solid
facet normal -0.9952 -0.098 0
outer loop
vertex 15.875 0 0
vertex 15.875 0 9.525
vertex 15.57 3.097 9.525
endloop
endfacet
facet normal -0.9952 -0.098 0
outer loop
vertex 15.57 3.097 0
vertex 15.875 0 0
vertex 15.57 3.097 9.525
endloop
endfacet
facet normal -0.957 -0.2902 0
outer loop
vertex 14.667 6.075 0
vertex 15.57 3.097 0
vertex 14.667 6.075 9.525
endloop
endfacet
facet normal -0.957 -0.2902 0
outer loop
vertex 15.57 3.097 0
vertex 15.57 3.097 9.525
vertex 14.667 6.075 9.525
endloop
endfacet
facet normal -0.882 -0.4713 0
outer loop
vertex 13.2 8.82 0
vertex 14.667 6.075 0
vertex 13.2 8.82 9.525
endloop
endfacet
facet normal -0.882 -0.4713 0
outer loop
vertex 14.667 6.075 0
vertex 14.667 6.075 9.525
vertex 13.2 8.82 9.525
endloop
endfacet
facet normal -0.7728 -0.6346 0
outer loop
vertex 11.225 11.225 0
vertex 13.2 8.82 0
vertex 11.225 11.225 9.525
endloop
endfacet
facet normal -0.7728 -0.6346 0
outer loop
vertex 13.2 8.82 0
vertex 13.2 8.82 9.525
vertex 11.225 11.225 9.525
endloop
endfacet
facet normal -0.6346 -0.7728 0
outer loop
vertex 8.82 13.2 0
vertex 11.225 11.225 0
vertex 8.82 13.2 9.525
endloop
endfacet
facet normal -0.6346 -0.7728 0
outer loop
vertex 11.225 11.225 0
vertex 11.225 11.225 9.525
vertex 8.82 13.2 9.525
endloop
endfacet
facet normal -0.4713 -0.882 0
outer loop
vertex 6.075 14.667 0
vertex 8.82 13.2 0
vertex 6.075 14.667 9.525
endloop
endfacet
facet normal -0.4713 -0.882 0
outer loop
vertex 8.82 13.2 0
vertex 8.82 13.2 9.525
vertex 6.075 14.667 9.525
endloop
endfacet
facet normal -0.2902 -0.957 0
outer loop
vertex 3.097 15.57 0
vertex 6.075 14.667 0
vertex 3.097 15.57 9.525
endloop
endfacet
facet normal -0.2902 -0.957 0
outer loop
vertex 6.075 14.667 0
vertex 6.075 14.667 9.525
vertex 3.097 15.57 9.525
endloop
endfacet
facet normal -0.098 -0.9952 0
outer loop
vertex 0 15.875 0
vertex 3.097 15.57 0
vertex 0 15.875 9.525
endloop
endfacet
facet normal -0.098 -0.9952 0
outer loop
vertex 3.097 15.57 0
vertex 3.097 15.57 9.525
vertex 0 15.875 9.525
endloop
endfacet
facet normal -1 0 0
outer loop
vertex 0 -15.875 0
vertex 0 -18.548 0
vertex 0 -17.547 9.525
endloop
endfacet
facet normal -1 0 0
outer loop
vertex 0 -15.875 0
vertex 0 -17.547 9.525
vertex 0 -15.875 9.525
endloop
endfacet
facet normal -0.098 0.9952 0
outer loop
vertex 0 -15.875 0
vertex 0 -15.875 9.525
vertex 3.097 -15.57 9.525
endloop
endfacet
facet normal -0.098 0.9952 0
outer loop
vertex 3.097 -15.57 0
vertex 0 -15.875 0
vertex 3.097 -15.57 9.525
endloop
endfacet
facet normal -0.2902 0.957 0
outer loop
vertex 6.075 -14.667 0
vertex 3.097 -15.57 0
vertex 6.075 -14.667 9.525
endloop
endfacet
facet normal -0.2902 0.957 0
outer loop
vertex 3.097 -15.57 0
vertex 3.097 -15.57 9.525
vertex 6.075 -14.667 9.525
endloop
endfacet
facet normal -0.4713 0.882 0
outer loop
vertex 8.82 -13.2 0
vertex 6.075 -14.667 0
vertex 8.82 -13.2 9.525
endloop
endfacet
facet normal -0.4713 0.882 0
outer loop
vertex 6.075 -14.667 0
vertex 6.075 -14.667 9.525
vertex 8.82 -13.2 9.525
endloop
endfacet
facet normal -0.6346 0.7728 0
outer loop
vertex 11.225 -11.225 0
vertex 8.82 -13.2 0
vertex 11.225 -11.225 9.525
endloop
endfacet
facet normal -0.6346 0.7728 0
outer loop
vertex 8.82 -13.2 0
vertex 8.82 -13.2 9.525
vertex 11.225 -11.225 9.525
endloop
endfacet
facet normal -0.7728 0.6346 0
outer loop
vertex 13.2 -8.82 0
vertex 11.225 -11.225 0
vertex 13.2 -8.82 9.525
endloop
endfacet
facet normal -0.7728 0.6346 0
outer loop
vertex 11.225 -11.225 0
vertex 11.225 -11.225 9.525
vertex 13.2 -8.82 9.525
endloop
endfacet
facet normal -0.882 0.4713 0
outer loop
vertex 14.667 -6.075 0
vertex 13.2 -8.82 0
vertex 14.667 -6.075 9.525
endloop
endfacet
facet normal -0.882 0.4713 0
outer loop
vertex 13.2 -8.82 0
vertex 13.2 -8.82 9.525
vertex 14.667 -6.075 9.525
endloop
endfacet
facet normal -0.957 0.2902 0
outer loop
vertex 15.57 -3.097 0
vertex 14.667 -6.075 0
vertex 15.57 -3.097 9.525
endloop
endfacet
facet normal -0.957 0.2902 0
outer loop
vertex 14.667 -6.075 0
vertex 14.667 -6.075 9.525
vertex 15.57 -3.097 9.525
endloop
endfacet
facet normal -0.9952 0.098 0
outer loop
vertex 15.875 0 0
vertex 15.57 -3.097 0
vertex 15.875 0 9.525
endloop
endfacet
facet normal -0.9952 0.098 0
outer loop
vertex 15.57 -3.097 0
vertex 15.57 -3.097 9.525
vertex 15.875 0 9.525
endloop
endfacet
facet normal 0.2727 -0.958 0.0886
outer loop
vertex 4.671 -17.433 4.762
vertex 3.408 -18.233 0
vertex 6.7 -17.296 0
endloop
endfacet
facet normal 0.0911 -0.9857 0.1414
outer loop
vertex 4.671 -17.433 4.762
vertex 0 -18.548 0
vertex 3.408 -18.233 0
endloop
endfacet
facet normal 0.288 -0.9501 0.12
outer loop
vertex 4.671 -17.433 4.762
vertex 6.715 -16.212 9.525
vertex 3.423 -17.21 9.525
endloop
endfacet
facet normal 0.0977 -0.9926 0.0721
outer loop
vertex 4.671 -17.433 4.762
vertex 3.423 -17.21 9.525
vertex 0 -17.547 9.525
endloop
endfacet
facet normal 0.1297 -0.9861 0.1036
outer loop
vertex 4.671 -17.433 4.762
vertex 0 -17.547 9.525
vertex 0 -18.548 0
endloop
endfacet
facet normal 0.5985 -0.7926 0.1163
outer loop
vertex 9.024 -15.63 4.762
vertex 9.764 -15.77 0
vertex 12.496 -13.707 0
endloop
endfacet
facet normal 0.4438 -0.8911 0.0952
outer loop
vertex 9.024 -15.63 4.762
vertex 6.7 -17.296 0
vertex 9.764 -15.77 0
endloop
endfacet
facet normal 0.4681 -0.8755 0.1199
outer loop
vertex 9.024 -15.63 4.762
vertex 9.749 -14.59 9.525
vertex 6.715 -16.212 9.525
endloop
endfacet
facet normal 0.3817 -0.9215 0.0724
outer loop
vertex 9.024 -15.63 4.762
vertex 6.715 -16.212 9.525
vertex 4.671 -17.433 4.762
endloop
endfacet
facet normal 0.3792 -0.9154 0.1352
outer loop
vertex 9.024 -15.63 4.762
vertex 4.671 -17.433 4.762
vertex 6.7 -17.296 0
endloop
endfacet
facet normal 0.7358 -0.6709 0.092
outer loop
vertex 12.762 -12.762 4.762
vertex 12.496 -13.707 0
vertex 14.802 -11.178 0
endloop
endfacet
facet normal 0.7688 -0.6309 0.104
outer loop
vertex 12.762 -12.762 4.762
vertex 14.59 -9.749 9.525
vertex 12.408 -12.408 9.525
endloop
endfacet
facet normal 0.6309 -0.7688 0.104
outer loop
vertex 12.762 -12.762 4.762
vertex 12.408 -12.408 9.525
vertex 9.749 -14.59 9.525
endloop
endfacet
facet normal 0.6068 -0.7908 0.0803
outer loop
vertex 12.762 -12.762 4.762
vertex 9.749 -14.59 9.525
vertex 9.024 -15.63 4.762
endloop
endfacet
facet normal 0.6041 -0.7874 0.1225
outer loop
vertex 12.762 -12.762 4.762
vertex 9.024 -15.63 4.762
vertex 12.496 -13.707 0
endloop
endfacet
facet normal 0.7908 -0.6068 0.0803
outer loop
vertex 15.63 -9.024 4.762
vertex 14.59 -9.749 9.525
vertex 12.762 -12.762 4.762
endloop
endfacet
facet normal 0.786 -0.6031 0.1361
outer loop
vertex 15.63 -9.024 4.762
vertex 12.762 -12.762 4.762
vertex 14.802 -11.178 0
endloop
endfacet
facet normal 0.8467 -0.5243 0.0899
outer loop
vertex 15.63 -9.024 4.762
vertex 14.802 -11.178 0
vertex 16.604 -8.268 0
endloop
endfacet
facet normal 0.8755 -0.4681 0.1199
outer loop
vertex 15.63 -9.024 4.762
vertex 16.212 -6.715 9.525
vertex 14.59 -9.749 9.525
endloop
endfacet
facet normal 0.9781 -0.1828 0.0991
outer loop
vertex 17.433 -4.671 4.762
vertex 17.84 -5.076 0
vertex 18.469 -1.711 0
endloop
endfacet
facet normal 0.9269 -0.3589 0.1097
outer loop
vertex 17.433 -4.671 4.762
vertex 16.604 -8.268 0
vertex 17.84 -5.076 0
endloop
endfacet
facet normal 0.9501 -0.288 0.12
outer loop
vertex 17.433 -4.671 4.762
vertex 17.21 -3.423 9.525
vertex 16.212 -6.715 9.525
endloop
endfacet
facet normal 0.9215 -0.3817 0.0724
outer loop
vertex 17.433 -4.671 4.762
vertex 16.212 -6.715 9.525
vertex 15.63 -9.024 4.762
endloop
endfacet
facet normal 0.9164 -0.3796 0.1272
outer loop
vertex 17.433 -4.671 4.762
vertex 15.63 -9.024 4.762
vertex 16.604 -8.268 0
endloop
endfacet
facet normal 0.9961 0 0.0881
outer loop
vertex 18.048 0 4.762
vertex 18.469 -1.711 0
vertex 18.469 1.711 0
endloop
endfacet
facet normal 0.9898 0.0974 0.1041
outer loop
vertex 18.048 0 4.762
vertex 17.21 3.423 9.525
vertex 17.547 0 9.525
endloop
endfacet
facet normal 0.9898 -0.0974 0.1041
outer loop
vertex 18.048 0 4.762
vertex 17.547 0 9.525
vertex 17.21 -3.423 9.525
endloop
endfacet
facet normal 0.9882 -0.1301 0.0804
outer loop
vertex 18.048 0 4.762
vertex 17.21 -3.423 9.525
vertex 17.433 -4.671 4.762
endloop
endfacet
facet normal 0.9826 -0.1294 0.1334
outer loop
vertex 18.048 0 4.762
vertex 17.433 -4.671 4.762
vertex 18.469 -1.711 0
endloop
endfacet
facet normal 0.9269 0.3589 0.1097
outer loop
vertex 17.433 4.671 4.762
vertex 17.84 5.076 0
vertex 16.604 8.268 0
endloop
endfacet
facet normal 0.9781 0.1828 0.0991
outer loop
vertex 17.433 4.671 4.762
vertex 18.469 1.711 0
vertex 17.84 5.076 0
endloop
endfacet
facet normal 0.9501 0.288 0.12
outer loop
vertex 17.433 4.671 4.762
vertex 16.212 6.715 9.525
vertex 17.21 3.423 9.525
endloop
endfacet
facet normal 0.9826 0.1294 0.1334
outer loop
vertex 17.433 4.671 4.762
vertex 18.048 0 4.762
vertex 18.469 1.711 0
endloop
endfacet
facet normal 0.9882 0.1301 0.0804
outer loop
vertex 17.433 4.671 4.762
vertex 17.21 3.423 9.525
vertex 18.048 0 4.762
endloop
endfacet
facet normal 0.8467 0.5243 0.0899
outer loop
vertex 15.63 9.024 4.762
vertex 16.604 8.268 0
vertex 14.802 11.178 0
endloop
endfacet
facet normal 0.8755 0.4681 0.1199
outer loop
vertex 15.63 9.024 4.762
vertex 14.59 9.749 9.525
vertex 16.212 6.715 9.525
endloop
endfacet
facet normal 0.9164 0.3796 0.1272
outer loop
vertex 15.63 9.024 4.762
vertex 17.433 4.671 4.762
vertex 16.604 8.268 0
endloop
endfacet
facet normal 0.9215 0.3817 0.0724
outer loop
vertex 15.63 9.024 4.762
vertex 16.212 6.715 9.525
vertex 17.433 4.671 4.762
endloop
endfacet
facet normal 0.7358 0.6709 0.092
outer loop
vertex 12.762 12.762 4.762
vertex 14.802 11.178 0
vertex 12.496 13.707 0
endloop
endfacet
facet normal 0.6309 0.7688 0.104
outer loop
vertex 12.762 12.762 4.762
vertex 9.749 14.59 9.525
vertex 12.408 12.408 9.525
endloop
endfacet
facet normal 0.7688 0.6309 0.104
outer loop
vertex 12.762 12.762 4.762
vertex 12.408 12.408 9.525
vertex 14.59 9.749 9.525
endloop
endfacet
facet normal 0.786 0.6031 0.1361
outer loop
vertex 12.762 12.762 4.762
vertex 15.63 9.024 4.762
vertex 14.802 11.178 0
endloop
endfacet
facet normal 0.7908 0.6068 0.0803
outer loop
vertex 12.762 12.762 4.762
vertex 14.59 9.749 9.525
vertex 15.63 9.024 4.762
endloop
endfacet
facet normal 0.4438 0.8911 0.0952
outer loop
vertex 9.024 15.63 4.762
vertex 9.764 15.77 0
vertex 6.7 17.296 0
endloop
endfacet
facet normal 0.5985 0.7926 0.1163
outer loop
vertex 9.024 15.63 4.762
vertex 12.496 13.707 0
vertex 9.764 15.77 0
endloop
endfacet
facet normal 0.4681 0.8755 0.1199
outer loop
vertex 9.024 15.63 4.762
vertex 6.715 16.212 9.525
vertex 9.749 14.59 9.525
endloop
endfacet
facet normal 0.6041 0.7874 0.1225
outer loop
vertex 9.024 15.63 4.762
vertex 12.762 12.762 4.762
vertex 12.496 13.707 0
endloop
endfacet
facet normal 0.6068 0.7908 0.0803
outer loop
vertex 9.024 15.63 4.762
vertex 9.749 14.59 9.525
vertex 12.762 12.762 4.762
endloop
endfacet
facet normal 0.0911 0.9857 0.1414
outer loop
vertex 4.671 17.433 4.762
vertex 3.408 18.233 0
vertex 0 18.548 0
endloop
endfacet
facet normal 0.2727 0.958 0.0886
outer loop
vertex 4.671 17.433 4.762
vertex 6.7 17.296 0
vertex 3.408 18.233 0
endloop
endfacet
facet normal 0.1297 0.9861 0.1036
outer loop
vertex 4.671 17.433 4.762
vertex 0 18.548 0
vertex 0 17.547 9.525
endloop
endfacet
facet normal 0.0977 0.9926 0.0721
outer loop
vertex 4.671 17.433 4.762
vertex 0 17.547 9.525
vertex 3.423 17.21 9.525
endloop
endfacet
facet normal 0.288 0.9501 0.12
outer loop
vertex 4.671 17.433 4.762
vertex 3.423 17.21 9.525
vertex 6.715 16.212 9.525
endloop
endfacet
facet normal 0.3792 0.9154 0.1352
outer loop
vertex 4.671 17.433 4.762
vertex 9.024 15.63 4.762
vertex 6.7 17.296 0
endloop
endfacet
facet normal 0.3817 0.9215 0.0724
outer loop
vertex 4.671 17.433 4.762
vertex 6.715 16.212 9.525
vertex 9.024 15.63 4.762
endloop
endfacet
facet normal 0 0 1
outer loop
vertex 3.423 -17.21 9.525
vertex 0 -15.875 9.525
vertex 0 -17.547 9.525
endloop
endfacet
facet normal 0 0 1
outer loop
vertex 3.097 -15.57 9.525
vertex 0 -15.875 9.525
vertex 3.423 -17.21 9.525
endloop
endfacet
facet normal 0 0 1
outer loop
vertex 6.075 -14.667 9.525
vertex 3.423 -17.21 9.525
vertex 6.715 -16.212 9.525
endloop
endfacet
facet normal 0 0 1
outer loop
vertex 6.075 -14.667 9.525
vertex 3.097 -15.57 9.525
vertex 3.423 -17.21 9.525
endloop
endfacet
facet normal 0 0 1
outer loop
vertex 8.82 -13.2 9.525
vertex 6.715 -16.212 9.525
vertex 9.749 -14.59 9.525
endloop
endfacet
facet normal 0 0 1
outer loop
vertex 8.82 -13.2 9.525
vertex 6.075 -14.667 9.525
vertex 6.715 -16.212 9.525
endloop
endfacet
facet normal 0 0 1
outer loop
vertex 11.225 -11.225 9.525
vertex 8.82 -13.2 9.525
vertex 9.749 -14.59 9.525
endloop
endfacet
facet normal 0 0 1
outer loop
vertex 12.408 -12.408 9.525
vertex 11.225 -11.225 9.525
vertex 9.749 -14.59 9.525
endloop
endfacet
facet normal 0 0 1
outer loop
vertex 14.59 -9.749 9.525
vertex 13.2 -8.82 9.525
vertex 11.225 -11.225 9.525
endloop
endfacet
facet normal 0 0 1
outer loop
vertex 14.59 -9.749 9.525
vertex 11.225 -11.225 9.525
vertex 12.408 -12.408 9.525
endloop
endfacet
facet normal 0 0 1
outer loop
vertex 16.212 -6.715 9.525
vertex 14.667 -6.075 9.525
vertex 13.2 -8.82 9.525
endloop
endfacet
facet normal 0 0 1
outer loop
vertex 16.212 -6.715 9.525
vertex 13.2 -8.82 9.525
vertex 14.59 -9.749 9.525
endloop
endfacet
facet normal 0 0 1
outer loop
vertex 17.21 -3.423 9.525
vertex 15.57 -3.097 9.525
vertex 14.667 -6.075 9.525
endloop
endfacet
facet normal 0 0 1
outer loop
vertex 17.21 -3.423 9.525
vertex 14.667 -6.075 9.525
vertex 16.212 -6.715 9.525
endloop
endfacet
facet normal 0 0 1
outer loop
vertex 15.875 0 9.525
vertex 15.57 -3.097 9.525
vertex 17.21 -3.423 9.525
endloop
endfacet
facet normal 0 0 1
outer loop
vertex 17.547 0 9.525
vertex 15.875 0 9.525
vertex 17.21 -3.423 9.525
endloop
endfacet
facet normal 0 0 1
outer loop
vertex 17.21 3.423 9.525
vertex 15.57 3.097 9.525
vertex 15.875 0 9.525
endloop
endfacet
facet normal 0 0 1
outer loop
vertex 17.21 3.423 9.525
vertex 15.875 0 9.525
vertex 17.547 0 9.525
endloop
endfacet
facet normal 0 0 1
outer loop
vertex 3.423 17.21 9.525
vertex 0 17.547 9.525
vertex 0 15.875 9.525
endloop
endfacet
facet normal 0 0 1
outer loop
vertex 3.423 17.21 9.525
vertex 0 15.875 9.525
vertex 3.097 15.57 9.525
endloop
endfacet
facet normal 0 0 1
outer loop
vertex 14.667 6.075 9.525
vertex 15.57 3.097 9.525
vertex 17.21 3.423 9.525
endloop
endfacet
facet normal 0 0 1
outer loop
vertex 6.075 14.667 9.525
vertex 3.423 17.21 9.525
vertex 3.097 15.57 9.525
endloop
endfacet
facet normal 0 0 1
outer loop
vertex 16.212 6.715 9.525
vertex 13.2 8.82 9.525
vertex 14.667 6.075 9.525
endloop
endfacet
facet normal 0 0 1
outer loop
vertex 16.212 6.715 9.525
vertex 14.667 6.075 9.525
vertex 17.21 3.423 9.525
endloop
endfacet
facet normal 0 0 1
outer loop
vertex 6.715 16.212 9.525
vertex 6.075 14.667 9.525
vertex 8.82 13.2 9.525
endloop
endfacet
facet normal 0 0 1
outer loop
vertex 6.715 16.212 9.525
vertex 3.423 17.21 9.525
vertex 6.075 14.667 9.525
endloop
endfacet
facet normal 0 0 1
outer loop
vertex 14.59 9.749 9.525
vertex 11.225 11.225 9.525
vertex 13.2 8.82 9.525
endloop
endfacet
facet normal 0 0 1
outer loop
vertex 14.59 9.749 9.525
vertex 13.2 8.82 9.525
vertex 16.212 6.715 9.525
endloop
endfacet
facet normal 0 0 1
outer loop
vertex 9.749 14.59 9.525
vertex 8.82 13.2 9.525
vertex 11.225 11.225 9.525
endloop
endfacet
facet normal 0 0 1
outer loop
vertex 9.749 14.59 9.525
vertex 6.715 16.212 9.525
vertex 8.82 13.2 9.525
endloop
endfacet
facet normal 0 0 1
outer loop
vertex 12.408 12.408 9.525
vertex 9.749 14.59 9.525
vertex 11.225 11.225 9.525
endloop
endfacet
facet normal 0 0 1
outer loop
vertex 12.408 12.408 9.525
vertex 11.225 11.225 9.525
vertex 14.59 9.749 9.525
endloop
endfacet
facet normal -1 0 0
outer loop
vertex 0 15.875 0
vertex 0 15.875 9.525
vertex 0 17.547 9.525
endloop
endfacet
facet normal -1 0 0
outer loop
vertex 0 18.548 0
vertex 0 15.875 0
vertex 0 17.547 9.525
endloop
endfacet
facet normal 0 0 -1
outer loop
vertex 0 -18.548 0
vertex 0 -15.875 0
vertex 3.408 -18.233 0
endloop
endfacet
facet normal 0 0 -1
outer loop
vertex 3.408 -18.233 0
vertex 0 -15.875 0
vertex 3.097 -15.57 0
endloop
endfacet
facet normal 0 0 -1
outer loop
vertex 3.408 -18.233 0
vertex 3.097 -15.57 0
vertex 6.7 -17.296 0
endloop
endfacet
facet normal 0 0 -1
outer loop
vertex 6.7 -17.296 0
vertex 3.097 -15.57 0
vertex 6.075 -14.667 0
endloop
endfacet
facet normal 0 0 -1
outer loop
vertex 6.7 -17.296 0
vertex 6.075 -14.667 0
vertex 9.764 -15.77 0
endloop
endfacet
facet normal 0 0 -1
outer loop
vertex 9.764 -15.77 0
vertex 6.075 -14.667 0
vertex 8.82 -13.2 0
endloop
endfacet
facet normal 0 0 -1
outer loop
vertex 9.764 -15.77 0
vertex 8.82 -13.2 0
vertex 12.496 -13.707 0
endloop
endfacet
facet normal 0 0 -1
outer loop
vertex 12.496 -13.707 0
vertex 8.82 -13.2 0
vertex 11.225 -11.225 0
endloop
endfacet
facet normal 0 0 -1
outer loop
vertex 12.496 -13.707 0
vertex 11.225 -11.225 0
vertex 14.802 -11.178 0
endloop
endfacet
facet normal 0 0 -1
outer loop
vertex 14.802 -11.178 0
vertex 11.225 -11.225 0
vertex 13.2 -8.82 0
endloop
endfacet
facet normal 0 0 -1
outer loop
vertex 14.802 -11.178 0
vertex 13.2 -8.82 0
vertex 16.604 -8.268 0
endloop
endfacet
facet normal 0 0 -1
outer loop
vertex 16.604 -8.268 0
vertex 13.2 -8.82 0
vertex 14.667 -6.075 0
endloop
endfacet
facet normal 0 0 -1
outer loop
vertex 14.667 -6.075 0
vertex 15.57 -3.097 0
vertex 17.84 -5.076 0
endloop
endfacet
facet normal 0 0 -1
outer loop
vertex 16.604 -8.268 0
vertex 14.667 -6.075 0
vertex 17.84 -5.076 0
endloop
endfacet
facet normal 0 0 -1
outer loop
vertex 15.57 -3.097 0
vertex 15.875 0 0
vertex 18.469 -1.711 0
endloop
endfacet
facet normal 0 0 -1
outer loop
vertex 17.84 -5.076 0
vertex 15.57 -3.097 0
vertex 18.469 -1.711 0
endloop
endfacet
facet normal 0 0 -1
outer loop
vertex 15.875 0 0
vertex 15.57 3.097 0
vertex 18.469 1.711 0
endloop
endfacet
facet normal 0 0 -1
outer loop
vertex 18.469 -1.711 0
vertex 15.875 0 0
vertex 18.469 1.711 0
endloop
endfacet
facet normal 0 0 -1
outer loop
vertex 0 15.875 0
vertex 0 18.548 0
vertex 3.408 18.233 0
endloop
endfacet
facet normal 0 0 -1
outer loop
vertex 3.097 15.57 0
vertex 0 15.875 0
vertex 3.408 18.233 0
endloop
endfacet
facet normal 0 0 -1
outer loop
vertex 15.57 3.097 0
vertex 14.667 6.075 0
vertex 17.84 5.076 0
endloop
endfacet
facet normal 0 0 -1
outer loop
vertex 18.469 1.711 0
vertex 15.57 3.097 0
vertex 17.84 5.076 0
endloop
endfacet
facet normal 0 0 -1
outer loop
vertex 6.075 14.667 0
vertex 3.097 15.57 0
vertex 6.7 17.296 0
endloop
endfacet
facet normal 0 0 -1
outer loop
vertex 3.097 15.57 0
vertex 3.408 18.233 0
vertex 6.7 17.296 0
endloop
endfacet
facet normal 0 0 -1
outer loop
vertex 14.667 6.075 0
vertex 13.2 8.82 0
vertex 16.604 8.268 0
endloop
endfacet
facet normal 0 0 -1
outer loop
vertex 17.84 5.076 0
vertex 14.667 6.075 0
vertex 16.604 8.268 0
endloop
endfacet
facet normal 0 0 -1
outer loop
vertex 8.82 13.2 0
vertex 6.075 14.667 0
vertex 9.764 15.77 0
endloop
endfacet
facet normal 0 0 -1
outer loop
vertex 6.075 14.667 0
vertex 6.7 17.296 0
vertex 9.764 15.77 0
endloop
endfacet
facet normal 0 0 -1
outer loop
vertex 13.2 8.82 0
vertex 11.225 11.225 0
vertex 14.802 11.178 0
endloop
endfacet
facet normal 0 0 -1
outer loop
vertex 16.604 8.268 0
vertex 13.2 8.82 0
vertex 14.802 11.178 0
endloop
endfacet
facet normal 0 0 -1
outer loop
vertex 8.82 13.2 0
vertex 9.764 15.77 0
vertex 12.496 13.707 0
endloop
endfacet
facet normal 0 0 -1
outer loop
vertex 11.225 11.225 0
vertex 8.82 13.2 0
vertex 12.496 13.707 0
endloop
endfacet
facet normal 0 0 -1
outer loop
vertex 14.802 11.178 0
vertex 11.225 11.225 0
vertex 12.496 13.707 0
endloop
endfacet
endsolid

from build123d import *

# Parameters (mm, degrees)
F0_R     = 18.54835
F1_DEPTH = 9.525
F1_TAPER = 6
F3_DEPTH = 25.4


with BuildPart() as f1:
    # F0 (on Top) → F1 (new body)
    with BuildSketch(Plane.XY):
        Circle(F0_R)
    extrude(amount=F1_DEPTH, taper=F1_TAPER)

    # F2 (on face) → F3 (cut)
    with BuildSketch(Plane.XY.offset(9.525)):
        with BuildLine():
            ThreePointArc((15.875, 0), (11.2253201513, 11.2253201513), (0, 15.875))
            Line((0, 15.875), (0, -15.875))
            ThreePointArc((0, -15.875), (11.2253201513, -11.2253201513), (15.875, 0))
        make_face()
        with BuildLine():
            Line((0, -15.875), (0, 15.875))
            ThreePointArc((0, 15.875), (-15.875, 0), (0, -15.875))
        make_face()
        with BuildLine():
            Line((0, 15.875), (0, 17.5472321591))
            ThreePointArc((0, 17.5472321591), (-17.5472321591, 0), (0, -17.5472321591))
            Line((0, -17.5472321591), (0, -15.875))
            ThreePointArc((0, -15.875), (-15.875, 0), (0, 15.875))
        make_face()
        with BuildLine():
            ThreePointArc((0, -17.5472321591), (-17.5472321591, 0), (0, 17.5472321591))
            Line((0, 17.5472321591), (0, 24.4940146804))
            Line((0, 24.4940146804), (-20.4020645469, 24.4940146804))
            Line((-20.4020645469, 24.4940146804), (-20.4020645469, -25.3320317715))
            Line((-20.4020645469, -25.3320317715), (0, -25.3320317715))
            Line((0, -25.3320317715), (0, -17.5472321591))
        make_face()
    extrude(amount=-F3_DEPTH, mode=Mode.SUBTRACT)


solid = f1.part
